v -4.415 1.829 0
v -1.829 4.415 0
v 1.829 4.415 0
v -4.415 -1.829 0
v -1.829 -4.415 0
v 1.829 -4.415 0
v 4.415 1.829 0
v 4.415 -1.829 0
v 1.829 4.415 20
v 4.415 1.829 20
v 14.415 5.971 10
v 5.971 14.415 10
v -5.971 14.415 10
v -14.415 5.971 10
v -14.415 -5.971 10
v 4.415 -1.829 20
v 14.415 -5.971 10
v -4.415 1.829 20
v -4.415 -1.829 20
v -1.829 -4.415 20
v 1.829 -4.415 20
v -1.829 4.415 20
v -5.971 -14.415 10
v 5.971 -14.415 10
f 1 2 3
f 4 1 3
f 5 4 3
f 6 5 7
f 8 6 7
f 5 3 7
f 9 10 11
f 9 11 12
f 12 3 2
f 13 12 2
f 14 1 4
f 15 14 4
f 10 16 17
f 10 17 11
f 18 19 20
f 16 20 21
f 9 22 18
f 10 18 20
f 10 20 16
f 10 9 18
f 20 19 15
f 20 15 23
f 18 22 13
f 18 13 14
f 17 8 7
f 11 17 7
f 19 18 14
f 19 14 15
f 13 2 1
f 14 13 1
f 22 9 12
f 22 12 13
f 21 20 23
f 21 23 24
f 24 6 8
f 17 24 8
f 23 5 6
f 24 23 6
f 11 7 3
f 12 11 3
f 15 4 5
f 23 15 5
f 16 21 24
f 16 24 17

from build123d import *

# Parameters (mm, degrees)
F1_DEPTH = 20
F2_SIZE  = 9.99999


# Not quite as in the source:
# - a fillet or chamfer is up to 0.001 mm smaller than in the source, because OpenCascade refuses the exact size


with BuildPart() as f1:
    # F0 (on Top) → F1 (new body)
    with BuildSketch(Plane.XY):
        Polygon((-5.9708582602, -14.4149269909), (5.9708582602, -14.4149269909), (11.5348123973, -8.8509728538), (14.4149269909, -3.8624680462), (14.4149269909, 3.8624680462), (11.5348123973, 8.8509728538), (5.9708582602, 14.4149269909), (-5.9708582602, 14.4149269909), (-11.5348123973, 8.8509728538), (-14.4149269909, 3.8624680462), (-14.4149269909, -3.8624680462), (-11.5348123973, -8.8509728538), align=None)
        Polygon((-14.4149269909, -5.9708582602), (-11.5348123973, -8.8509728538), (-14.4149269909, -3.8624680462), align=None)
        Polygon((-14.4149269909, 5.9708582602), (-14.4149269909, 3.8624680462), (-11.5348123973, 8.8509728538), align=None)
        Polygon((14.4149269909, -3.8624680462), (11.5348123973, -8.8509728538), (14.4149269909, -5.9708582602), align=None)
        Polygon((11.5348123973, 8.8509728538), (14.4149269909, 3.8624680462), (14.4149269909, 5.9708582602), align=None)
    extrude(amount=F1_DEPTH)

    # F2 (size 10 in the source; OpenCascade refuses exactly that, so slightly less here)
    f2_edges = [f1.edges().sort_by_distance(p)[0] for p in [
        (0, 14.414927, 20),
        (-10.192893, 10.192893, 20),
        (-14.414927, 0, 20),
        (-10.192893, -10.192893, 20),
        (0, -14.414927, 20),
        (10.192893, -10.192893, 20),
        (14.414927, 0, 20),
        (10.192893, 10.192893, 20),
        (0, 14.414927, 0),
        (-10.192893, 10.192893, 0),
        (-14.414927, 0, 0),
        (-10.192893, -10.192893, 0),
        (0, -14.414927, 0),
        (10.192893, -10.192893, 0),
        (14.414927, 0, 0),
        (10.192893, 10.192893, 0),
    ]]
    chamfer(f2_edges, length=F2_SIZE)


solid = f1.part
